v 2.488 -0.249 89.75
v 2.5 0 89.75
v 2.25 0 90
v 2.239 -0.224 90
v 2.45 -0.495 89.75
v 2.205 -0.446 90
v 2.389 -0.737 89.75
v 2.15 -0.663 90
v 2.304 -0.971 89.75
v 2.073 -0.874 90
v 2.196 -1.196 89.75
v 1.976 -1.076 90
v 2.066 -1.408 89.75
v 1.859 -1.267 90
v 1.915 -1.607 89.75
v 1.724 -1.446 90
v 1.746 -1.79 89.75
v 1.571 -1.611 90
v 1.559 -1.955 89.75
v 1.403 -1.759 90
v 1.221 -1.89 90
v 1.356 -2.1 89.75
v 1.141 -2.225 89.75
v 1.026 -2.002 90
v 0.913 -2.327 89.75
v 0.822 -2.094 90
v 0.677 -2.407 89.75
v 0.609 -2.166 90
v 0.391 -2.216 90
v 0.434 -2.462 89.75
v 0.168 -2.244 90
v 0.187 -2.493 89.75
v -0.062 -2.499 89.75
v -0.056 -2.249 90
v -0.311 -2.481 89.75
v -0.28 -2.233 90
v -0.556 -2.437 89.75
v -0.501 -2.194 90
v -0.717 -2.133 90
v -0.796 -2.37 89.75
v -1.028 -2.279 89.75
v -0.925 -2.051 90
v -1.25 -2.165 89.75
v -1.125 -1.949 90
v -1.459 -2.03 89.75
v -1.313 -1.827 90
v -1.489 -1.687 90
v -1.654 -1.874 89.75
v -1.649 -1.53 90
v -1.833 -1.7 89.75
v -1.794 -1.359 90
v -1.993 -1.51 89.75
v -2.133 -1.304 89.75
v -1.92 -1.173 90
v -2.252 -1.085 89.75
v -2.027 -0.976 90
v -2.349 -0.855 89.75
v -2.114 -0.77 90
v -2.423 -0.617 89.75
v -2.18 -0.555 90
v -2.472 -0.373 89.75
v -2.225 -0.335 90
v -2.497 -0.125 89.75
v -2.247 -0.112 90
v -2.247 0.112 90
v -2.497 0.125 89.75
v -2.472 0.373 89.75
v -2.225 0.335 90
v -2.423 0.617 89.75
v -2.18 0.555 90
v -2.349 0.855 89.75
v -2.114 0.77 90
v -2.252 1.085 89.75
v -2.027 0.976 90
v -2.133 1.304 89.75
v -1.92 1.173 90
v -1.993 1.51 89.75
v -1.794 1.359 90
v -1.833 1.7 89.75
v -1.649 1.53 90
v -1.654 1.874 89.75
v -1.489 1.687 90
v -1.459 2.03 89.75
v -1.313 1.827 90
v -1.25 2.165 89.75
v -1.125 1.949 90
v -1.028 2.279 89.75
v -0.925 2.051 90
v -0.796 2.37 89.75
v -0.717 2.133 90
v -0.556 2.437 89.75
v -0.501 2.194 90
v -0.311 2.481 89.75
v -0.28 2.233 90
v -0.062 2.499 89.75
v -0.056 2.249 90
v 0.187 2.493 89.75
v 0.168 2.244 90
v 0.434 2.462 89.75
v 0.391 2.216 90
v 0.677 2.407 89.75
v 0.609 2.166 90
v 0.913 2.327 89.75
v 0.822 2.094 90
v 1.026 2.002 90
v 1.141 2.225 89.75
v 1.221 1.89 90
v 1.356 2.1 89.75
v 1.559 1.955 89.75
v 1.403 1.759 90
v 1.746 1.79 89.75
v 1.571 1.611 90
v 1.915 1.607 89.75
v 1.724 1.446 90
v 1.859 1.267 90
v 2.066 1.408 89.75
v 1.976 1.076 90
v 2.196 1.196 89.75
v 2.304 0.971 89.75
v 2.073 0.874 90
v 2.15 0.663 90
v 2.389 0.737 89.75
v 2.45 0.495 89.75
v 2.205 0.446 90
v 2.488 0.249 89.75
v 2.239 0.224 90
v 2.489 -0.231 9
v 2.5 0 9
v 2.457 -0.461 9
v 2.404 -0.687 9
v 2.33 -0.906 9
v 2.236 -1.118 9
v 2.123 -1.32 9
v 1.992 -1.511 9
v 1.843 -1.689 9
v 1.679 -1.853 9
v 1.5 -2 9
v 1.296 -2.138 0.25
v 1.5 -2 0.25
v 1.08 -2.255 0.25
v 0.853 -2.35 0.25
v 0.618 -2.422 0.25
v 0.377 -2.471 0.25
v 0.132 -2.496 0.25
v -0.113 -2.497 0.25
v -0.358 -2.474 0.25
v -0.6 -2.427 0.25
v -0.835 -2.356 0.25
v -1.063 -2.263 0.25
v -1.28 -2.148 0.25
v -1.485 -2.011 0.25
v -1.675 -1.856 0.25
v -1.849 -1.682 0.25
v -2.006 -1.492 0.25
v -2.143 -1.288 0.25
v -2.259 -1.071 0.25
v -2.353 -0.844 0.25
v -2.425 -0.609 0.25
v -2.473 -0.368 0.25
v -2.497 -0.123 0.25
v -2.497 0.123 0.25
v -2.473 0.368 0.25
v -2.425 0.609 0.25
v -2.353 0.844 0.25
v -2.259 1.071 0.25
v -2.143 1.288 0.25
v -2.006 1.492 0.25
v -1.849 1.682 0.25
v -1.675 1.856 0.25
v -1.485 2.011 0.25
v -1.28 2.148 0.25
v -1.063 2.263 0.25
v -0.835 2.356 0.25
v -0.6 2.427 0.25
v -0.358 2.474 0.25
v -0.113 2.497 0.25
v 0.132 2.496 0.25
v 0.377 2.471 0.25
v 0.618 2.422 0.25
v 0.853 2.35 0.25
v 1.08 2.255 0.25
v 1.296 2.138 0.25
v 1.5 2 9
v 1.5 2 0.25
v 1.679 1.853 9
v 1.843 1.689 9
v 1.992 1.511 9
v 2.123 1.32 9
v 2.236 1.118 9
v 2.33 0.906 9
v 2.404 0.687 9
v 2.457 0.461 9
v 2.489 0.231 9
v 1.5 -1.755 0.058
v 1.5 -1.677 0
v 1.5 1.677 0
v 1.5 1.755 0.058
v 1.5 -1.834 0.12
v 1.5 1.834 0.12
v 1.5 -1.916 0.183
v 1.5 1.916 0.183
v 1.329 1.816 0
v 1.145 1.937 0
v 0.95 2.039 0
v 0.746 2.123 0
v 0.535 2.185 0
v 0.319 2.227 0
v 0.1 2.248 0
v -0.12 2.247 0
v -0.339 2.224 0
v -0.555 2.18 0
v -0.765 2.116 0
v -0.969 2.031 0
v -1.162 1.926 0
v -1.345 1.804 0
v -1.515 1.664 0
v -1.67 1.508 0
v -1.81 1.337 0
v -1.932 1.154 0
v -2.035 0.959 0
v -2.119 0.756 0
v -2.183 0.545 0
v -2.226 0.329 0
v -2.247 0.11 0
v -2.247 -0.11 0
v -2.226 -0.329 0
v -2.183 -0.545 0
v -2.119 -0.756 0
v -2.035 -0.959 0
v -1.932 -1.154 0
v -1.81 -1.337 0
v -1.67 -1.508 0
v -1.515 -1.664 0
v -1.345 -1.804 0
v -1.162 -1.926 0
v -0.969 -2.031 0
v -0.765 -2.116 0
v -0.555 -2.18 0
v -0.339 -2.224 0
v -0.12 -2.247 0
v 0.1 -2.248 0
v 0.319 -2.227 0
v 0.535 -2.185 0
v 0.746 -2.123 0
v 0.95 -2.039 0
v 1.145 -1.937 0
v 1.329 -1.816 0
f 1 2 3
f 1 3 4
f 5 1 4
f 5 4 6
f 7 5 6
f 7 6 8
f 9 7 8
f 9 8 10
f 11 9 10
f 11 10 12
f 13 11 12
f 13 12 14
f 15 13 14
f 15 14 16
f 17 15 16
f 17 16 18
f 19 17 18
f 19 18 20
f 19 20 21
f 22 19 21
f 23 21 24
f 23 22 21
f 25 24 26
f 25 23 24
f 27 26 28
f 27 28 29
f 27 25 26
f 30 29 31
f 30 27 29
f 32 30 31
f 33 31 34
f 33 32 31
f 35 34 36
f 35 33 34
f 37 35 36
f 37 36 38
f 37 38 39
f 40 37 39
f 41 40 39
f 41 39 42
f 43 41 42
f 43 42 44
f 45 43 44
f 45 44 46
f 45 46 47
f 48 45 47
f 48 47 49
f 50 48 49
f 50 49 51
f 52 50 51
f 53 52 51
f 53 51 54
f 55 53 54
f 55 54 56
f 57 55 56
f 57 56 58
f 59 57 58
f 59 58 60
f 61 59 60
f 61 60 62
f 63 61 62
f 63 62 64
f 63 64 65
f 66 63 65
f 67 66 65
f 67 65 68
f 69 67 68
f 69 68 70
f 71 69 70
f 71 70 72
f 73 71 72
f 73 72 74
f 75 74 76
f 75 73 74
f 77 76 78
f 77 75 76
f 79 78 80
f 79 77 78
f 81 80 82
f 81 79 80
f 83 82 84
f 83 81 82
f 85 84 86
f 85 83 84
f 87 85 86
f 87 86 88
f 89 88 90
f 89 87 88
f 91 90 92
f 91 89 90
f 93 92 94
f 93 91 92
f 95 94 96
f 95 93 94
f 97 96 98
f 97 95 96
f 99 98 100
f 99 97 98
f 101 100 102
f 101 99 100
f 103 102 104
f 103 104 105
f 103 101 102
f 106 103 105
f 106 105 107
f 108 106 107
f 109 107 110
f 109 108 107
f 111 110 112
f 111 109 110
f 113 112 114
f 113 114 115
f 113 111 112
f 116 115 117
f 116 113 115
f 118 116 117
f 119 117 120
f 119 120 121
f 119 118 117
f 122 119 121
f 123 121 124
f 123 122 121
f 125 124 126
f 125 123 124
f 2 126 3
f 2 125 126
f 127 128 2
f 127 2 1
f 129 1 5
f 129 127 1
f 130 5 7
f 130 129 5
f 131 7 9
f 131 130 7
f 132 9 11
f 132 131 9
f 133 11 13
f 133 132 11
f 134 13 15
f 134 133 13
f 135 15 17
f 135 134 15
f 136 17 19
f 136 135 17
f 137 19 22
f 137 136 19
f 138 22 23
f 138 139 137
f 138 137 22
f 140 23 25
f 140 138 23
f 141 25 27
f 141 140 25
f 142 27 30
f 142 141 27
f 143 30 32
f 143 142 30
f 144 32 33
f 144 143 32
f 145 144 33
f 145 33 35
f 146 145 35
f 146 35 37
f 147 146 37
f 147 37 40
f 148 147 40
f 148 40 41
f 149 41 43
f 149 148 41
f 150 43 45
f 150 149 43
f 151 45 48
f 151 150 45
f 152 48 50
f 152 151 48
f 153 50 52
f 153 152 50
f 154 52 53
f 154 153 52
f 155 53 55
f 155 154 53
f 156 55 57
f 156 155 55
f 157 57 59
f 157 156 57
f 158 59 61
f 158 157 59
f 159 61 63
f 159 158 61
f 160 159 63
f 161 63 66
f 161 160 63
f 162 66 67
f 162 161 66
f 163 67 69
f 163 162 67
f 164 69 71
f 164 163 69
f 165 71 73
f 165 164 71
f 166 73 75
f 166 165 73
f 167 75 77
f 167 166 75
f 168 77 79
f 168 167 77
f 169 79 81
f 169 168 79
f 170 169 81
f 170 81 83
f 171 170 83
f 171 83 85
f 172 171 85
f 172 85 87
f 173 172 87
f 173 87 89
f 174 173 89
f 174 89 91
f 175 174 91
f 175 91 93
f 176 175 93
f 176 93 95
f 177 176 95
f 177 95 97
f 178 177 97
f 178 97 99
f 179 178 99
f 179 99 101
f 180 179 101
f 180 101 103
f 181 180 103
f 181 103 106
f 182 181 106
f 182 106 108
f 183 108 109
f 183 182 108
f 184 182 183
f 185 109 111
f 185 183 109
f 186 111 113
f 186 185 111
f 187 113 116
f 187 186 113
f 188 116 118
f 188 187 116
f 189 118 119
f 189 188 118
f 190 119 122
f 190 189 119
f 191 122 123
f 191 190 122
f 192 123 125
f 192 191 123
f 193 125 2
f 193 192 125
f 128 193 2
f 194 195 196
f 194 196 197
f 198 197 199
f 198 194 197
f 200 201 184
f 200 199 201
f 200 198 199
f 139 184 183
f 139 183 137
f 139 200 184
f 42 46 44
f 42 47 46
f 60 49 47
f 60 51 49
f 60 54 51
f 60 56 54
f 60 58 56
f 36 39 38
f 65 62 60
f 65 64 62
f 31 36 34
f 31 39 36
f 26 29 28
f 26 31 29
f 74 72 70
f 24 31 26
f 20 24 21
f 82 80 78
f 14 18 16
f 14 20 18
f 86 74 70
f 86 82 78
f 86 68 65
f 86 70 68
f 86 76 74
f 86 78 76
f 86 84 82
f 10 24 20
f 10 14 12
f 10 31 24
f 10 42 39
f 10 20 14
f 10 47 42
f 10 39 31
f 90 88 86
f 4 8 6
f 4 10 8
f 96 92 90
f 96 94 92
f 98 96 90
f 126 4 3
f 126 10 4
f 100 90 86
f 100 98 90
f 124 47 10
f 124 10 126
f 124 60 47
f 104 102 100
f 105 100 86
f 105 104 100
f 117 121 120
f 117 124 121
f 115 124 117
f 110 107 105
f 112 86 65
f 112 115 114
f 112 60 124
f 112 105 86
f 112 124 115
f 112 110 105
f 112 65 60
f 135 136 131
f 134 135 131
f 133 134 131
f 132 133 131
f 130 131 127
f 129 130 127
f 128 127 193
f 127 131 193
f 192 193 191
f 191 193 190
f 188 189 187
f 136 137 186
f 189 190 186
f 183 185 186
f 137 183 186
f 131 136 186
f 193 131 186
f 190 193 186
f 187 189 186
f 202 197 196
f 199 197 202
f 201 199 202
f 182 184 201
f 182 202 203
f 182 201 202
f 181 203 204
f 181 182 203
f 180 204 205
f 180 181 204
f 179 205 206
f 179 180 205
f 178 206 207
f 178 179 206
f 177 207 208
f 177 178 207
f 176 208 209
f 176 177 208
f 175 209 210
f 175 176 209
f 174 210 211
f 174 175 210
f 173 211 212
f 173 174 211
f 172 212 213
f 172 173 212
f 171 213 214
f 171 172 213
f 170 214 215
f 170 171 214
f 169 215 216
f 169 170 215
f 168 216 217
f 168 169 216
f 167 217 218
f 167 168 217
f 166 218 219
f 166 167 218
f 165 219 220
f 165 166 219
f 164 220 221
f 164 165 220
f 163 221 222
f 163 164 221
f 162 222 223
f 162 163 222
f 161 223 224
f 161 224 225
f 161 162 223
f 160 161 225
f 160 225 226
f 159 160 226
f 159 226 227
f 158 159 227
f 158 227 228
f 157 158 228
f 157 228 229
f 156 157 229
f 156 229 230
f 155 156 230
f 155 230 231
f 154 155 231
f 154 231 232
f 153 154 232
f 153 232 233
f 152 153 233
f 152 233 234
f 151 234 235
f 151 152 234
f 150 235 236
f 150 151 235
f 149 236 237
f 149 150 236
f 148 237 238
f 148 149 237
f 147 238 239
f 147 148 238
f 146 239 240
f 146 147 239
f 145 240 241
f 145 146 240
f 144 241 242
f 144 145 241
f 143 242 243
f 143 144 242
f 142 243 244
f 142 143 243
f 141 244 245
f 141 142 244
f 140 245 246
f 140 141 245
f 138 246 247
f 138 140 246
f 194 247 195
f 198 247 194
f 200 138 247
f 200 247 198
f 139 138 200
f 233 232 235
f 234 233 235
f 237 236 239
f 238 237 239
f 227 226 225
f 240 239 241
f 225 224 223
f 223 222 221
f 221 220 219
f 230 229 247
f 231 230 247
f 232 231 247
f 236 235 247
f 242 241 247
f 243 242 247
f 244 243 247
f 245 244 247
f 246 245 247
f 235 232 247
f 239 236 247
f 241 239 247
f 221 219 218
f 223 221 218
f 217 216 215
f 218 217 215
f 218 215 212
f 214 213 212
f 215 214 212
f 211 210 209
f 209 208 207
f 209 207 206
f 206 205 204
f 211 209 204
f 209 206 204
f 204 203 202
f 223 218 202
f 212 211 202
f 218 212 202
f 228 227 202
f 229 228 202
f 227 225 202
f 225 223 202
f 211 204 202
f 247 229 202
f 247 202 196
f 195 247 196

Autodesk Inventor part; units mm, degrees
ref_plane "YZ Plane" through (0, 0, 0) normal (1, 0, 0) x (0, 1, 0)
ref_plane "XZ Plane" through (0, 0, 0) normal (0, 1, 0) x (-1, 0, 0)
ref_plane "XY Plane" through (0, 0, 0) normal (0, 0, 1) x (1, 0, 0)
sketch "Sketch1" plane through (0, 0, 0) normal (0, 0, 1) x (1, 0, 0)
  circle A0 centre (0, 0) radius 2.5
  line L0 (1.5, 2) -> (1.5, -2)
  dimension "d0" = 5
  dimension "d1" = 1.5
extrude "Extrusion1" add sketch "Sketch1" along normal blind 90
extrude "Extrusion2" cut sketch "Sketch1" along normal blind 9 contours A0 L0 picked at (1.6398, 0.534)
chamfer "Chamfer1" distance 0.25 angle 45 2 edges at (-2.5, 0, 90) (-2.5, 0, 0)
properties part number "HeatExchangePistonShaft"
